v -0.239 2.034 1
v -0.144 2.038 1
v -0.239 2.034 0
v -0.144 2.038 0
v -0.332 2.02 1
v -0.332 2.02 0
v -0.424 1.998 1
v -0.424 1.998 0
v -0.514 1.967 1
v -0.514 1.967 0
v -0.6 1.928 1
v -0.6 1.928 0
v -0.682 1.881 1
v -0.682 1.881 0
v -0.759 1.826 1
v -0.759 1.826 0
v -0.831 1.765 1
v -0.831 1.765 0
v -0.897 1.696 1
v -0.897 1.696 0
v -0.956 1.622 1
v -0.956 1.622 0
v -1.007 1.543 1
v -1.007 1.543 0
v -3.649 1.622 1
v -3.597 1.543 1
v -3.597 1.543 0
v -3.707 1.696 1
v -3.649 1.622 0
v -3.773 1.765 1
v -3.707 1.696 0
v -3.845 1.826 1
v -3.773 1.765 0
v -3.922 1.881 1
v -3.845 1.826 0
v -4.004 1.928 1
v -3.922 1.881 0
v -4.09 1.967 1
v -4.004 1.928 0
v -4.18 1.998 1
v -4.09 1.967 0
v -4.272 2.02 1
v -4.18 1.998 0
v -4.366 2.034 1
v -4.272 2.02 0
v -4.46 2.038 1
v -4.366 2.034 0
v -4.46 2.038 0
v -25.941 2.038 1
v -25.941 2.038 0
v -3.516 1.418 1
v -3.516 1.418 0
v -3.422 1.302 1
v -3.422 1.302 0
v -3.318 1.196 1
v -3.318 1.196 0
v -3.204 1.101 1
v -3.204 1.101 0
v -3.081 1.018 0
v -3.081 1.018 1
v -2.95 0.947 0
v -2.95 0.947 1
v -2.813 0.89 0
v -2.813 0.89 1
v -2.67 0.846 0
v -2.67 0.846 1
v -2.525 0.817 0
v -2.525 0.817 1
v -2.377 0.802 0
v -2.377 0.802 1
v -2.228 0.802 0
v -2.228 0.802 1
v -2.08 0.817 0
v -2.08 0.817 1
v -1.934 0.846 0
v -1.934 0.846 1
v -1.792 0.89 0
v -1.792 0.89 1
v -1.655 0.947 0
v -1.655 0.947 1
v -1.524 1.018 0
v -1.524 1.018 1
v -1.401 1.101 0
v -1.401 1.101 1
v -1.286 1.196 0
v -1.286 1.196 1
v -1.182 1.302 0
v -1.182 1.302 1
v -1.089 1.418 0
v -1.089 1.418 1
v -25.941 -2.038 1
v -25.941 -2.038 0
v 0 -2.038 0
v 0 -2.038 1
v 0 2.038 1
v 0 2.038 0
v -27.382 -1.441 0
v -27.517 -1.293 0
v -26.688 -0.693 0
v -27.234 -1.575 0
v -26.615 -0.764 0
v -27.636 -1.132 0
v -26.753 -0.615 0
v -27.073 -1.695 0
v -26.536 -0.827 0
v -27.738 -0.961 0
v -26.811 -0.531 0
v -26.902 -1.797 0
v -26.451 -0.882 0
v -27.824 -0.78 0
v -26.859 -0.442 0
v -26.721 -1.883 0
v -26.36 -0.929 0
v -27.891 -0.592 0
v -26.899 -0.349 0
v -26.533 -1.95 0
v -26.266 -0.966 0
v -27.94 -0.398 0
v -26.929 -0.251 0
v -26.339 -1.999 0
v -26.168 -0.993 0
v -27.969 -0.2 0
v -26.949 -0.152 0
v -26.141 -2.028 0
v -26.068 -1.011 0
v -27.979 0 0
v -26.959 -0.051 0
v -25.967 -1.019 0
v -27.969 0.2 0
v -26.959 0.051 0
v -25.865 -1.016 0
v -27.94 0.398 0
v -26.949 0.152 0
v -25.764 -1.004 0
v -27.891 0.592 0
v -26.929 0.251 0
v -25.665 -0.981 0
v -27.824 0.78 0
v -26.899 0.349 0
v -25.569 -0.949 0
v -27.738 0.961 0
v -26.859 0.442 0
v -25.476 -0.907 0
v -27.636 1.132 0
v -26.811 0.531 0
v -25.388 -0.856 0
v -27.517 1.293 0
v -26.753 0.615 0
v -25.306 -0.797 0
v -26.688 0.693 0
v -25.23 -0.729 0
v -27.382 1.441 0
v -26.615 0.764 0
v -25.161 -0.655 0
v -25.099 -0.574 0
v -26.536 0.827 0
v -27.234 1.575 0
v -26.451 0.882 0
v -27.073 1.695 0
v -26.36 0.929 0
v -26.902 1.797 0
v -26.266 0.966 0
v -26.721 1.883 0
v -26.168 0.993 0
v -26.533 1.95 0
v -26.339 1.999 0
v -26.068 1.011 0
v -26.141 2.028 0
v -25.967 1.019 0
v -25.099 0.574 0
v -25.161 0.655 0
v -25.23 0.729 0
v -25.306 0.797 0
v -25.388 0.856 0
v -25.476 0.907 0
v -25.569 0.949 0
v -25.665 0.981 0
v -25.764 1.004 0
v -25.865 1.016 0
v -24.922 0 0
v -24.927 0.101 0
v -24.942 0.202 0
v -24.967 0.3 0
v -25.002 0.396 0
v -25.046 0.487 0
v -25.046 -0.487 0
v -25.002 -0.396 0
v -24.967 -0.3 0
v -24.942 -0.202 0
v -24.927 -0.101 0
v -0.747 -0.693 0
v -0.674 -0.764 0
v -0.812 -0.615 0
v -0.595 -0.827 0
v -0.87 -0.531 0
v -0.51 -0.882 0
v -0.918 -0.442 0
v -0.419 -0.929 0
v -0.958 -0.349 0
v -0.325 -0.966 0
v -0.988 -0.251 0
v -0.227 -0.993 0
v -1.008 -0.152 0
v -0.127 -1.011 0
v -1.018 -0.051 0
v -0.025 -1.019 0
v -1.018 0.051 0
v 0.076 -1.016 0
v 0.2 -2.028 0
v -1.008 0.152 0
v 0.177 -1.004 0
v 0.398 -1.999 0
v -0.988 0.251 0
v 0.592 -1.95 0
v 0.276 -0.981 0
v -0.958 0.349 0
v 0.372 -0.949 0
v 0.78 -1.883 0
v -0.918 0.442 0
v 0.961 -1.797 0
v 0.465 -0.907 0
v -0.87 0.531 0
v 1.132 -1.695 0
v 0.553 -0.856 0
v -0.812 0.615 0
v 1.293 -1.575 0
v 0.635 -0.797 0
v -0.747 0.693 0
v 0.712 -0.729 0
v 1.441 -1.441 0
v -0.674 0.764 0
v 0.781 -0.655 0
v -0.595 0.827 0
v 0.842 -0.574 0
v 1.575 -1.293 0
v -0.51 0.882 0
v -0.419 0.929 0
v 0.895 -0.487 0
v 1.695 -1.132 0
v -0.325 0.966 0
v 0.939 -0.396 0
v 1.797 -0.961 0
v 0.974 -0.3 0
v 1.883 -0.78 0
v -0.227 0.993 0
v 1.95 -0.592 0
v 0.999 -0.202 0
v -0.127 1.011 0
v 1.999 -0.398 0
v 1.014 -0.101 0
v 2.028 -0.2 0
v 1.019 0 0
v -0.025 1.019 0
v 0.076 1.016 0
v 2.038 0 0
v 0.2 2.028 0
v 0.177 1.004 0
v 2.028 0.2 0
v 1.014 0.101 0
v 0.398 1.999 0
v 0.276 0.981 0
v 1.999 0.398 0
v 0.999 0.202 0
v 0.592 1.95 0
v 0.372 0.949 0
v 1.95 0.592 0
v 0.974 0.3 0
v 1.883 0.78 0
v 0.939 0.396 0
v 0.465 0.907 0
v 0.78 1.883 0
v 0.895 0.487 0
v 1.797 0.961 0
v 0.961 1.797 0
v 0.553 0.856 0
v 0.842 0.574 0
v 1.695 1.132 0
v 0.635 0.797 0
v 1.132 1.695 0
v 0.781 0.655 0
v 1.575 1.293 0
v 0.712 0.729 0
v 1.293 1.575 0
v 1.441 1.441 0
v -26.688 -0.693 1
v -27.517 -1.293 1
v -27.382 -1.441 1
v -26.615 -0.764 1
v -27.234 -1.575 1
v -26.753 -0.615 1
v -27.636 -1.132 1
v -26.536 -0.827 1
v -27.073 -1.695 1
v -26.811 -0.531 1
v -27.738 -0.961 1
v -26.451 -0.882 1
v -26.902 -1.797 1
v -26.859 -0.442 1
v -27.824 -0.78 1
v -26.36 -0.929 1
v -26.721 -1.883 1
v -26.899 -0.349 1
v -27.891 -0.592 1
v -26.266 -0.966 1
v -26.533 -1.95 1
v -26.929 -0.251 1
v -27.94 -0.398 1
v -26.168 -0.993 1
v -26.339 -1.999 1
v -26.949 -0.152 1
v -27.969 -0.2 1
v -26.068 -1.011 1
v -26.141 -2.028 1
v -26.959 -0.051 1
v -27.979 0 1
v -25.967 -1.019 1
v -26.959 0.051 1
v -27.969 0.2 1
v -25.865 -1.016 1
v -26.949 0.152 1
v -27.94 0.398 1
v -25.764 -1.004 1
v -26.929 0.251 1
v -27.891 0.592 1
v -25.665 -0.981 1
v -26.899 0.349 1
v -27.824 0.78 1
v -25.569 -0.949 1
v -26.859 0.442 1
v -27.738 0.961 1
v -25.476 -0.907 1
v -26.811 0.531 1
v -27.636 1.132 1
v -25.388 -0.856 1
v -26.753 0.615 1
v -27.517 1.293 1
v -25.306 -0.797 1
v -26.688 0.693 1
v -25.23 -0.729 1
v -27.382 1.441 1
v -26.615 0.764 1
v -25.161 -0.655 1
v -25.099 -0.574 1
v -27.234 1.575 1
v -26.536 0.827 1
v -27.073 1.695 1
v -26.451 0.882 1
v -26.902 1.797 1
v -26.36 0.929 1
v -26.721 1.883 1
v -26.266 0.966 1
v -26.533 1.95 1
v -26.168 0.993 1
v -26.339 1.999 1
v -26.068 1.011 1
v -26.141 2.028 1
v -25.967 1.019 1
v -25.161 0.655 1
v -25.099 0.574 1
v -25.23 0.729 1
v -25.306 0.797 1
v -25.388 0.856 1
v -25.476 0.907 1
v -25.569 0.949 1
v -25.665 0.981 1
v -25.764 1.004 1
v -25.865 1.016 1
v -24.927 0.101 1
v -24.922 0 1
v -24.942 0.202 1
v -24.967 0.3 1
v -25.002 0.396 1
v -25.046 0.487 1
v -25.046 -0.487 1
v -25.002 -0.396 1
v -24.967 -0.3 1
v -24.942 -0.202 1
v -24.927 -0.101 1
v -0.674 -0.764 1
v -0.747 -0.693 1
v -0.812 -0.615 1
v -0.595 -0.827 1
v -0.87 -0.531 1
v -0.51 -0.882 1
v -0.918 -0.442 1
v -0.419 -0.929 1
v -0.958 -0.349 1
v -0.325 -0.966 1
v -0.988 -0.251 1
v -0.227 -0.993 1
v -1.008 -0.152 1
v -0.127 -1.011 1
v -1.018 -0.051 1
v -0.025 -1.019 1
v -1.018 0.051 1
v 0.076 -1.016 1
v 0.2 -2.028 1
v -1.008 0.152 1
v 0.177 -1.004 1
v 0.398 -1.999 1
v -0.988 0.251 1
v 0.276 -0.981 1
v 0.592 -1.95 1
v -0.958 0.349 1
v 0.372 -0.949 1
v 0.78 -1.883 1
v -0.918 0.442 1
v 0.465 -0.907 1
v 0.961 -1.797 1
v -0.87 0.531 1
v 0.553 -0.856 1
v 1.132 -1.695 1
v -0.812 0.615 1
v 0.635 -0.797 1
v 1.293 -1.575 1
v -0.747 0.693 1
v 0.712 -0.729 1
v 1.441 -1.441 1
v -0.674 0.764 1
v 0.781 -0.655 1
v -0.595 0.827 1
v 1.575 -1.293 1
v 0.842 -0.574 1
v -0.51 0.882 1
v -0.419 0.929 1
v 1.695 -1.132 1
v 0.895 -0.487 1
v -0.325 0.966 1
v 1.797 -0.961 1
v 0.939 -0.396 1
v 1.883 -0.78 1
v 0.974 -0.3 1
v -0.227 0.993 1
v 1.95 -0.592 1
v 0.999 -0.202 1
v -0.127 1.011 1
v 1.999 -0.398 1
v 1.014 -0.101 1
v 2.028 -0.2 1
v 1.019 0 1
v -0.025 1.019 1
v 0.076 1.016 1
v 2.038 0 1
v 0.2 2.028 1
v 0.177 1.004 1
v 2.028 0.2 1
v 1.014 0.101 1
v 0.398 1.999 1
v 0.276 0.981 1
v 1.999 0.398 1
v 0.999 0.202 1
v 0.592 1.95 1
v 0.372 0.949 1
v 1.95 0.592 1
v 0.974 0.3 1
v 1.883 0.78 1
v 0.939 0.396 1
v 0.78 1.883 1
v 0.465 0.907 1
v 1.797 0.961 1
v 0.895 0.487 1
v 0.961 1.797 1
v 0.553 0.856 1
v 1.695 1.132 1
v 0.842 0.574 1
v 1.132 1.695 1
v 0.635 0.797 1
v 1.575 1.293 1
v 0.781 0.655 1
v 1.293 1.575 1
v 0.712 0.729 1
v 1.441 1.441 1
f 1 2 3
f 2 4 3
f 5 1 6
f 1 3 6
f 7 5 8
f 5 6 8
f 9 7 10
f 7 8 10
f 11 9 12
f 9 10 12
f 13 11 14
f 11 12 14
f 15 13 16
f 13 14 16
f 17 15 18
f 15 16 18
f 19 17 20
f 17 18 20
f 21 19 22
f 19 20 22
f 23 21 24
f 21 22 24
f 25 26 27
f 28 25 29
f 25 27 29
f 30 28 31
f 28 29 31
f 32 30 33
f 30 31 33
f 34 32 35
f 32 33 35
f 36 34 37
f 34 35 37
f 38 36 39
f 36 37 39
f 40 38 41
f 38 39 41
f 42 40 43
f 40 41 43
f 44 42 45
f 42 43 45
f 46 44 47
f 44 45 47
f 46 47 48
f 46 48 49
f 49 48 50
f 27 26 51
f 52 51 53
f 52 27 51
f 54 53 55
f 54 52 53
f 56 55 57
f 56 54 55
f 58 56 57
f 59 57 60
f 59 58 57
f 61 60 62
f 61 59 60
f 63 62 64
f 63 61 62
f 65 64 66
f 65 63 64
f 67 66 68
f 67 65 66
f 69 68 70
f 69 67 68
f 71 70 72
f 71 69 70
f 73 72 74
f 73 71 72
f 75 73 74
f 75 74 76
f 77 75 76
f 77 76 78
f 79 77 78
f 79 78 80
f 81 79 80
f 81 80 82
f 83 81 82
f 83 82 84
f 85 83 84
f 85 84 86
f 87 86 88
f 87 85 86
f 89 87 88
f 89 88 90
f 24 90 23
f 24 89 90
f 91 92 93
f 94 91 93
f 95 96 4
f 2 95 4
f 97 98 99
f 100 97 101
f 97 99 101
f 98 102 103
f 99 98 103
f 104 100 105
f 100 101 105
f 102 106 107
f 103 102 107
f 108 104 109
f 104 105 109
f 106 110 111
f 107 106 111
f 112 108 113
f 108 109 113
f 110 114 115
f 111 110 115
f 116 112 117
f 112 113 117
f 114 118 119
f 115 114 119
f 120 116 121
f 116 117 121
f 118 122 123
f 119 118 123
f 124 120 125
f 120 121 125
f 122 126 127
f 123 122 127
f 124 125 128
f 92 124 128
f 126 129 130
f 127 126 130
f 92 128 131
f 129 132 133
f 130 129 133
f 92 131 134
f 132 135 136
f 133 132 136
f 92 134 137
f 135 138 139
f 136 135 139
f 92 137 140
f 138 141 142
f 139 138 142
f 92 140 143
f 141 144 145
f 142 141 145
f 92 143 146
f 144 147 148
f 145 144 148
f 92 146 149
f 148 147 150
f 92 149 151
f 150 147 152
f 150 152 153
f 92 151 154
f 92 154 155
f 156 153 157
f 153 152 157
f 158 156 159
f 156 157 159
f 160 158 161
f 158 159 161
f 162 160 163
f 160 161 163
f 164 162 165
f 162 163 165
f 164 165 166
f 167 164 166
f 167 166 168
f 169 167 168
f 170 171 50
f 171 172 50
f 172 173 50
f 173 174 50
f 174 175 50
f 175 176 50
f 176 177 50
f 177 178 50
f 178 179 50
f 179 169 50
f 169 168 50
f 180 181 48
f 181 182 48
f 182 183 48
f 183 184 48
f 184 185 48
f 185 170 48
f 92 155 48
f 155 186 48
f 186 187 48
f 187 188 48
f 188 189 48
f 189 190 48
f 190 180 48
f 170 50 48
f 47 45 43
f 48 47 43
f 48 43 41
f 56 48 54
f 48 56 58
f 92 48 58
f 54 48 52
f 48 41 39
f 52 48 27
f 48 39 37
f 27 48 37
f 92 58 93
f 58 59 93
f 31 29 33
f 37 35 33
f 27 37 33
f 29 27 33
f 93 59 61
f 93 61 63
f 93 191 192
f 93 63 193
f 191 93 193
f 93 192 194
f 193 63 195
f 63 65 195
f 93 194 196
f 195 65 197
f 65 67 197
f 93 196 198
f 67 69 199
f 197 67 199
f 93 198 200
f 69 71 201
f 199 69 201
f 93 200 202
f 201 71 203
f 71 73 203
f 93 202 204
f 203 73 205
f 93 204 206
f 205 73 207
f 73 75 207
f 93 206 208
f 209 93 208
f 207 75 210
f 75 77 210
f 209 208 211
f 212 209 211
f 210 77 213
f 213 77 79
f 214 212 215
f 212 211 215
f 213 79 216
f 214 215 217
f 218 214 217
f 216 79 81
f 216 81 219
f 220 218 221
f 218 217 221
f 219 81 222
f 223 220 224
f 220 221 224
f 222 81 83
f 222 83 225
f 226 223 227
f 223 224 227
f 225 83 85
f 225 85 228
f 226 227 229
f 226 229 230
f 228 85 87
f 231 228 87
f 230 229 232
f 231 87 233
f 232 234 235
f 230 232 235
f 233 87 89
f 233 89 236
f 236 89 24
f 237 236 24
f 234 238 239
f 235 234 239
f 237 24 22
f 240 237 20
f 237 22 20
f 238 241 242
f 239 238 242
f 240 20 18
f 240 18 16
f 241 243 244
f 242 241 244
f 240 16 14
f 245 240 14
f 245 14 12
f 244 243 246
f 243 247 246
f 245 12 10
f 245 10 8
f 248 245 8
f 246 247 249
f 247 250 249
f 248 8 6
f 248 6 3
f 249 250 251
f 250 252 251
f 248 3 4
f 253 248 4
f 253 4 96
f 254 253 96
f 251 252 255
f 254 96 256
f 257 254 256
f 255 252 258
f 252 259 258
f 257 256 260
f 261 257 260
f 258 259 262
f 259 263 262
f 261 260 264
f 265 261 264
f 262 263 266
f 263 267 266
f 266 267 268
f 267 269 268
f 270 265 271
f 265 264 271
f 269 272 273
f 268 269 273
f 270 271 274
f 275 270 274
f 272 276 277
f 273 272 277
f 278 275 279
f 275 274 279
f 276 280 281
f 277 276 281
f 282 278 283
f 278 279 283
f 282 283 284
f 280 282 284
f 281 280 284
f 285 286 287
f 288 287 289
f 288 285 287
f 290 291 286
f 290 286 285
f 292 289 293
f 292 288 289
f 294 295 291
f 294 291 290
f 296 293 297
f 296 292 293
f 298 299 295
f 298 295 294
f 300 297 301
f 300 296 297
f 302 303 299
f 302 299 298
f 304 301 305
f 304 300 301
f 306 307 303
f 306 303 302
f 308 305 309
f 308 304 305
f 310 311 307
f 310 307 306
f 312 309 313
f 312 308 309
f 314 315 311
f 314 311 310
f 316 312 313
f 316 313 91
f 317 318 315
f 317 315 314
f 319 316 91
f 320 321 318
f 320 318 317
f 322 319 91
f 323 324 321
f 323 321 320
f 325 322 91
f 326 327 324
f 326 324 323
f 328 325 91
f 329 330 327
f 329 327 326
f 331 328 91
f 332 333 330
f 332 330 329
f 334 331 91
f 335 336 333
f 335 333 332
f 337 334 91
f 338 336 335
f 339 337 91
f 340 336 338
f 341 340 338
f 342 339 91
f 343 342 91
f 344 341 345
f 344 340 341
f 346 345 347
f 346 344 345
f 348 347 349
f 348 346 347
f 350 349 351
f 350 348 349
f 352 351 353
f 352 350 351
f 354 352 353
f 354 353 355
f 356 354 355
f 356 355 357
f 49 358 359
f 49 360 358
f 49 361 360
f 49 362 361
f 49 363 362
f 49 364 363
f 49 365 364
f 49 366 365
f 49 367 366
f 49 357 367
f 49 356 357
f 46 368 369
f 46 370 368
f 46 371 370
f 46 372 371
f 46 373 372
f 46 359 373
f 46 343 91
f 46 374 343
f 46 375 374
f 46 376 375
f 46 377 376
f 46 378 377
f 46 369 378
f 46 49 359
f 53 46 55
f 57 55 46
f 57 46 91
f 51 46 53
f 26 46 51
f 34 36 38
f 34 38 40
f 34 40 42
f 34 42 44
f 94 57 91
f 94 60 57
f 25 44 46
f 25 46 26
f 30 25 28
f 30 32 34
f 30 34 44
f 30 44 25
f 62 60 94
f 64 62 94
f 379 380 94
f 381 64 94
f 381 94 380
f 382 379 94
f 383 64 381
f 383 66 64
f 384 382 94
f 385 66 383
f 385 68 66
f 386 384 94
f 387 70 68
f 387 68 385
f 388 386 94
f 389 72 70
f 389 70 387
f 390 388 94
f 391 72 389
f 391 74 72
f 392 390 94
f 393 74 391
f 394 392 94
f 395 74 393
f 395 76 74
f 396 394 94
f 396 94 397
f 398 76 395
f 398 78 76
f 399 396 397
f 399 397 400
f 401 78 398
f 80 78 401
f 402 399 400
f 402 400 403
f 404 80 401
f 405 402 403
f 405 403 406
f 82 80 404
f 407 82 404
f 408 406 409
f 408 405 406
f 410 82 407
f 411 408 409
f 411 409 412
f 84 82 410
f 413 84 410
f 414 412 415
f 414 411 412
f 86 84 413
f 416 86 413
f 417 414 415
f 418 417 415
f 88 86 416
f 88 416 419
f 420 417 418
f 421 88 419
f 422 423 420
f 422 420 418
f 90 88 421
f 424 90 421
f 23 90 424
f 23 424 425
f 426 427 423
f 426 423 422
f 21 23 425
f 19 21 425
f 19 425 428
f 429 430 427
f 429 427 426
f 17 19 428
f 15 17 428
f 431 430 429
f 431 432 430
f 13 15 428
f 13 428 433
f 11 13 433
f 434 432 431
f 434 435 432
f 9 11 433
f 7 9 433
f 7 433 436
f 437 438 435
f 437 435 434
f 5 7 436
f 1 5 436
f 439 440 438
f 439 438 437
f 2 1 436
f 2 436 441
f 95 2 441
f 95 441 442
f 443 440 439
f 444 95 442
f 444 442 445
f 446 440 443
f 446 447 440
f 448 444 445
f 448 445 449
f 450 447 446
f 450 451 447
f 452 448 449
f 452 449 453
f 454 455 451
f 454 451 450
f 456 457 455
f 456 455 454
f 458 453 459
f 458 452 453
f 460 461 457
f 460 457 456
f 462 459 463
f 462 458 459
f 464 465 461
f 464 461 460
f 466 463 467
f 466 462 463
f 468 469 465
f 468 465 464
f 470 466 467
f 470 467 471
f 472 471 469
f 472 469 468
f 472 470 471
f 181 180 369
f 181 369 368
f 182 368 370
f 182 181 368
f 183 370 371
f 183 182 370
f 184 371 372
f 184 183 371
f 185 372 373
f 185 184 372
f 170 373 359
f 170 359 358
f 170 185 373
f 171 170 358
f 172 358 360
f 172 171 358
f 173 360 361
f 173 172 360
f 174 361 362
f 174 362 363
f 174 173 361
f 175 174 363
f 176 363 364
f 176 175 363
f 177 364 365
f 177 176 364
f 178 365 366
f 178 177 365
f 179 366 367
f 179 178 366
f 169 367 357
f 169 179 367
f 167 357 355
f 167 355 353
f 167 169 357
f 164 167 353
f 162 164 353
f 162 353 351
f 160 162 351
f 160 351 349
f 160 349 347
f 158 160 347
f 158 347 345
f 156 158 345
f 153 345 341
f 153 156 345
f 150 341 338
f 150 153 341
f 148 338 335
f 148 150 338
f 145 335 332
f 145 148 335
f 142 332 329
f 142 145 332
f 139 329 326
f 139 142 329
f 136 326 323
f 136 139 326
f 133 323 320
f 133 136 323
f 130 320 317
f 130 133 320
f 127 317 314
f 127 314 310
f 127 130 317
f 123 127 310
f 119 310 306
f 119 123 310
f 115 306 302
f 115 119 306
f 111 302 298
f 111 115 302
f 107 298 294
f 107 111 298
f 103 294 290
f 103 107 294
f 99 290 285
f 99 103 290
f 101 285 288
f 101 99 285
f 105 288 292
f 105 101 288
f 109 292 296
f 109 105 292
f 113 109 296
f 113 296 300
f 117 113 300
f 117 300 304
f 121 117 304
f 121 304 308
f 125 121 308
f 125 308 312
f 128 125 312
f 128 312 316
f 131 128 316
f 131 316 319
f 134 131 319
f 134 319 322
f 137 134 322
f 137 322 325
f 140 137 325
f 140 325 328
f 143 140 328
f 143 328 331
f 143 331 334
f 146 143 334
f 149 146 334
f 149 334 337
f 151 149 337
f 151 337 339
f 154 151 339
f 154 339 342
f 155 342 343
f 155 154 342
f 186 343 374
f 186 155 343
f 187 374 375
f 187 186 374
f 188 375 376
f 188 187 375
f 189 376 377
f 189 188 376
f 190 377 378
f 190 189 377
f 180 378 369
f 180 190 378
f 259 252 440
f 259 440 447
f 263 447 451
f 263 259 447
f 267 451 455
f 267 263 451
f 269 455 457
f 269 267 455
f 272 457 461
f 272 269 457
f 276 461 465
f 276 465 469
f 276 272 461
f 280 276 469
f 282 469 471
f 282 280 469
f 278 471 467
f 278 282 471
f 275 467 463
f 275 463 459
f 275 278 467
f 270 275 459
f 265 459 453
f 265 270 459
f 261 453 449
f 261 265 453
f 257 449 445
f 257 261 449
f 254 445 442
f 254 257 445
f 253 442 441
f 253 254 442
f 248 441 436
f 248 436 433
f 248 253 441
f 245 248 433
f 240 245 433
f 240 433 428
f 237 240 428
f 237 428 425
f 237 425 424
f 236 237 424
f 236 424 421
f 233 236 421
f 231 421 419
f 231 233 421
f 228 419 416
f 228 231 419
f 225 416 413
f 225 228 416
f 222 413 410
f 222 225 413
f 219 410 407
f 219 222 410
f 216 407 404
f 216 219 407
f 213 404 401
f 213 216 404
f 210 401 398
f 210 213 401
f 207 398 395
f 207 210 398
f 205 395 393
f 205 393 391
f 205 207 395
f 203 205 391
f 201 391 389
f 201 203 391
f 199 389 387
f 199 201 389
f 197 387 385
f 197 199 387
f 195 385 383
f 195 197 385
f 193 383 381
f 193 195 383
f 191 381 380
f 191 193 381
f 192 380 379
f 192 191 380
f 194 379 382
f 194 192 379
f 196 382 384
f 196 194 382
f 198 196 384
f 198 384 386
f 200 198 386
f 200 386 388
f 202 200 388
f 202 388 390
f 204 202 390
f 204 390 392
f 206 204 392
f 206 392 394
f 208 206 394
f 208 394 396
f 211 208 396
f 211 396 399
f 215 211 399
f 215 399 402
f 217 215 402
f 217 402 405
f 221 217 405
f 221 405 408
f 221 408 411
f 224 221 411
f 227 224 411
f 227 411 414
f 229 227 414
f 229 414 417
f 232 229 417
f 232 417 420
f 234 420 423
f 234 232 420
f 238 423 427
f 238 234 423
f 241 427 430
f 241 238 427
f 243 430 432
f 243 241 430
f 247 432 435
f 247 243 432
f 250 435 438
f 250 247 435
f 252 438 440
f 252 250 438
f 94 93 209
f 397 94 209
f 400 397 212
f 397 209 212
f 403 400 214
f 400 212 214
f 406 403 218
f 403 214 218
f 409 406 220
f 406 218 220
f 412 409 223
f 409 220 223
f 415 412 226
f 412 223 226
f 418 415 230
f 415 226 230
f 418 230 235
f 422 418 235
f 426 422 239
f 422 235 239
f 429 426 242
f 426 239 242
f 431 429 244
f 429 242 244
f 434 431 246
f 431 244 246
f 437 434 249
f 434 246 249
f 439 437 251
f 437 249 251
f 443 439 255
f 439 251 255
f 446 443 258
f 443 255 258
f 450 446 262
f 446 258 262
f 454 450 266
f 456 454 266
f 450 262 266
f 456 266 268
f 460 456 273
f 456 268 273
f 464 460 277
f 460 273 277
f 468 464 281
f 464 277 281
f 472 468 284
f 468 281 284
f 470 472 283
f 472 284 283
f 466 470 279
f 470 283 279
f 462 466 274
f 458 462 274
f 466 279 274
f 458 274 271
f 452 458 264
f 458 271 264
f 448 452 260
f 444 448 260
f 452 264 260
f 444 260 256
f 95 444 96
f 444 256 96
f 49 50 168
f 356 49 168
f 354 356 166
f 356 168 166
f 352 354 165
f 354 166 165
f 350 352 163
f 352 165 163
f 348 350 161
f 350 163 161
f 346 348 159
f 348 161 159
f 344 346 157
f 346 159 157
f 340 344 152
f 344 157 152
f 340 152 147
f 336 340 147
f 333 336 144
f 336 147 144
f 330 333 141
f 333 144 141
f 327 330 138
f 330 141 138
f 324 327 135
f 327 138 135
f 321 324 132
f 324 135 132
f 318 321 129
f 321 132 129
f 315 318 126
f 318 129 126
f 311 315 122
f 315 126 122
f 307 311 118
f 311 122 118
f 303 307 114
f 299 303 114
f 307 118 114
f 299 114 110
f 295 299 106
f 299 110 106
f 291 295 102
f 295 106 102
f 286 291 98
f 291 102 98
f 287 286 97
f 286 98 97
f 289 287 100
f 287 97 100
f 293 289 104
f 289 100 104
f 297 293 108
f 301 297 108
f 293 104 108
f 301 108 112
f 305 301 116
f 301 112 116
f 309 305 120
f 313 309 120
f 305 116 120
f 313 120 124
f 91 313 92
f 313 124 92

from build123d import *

# Parameters (mm, degrees)
SKETCH1_R          = 1.01901554
EXTRUDE1_DEPTH     = 1
SKETCH2_R          = 1.5
CUT_EXTRUDE2_DEPTH = 29.071089649
FILLET1_R          = 1


with BuildPart() as part:
    # Sketch1 → Extrude1 (new body)
    with BuildSketch(Plane.XY):
        with BuildLine():
            Line((0, 2.038031079), (-25.941113, 2.038031079))
            ThreePointArc((-25.941113, 2.038031079), (-27.979144079, 0), (-25.941113, -2.038031079))
            Line((-25.941113, -2.038031079), (0, -2.038031079))
            ThreePointArc((0, -2.038031079), (2.038031079, 0), (0, 2.038031079))
        make_face()
        with Locations((-25.941113, 0)):
            Circle(SKETCH1_R, mode=Mode.SUBTRACT)
        Circle(SKETCH1_R, mode=Mode.SUBTRACT)
    extrude(amount=EXTRUDE1_DEPTH)

    # Sketch2 → Cut-Extrude2 (cut, through all)
    with BuildSketch(Plane.XY):
        with Locations((-2.302162805, 2.3)):
            Circle(SKETCH2_R)
    extrude(amount=CUT_EXTRUDE2_DEPTH, mode=Mode.SUBTRACT)

    # Fillet1
    fillet1_edges = [part.edges().sort_by_distance(p)[0] for p in [
        (-0.825215858, 2.038031079, 0.5),
        (-3.779109752, 2.038031079, 0.5),
    ]]
    fillet(fillet1_edges, radius=FILLET1_R)


solid = part.part
